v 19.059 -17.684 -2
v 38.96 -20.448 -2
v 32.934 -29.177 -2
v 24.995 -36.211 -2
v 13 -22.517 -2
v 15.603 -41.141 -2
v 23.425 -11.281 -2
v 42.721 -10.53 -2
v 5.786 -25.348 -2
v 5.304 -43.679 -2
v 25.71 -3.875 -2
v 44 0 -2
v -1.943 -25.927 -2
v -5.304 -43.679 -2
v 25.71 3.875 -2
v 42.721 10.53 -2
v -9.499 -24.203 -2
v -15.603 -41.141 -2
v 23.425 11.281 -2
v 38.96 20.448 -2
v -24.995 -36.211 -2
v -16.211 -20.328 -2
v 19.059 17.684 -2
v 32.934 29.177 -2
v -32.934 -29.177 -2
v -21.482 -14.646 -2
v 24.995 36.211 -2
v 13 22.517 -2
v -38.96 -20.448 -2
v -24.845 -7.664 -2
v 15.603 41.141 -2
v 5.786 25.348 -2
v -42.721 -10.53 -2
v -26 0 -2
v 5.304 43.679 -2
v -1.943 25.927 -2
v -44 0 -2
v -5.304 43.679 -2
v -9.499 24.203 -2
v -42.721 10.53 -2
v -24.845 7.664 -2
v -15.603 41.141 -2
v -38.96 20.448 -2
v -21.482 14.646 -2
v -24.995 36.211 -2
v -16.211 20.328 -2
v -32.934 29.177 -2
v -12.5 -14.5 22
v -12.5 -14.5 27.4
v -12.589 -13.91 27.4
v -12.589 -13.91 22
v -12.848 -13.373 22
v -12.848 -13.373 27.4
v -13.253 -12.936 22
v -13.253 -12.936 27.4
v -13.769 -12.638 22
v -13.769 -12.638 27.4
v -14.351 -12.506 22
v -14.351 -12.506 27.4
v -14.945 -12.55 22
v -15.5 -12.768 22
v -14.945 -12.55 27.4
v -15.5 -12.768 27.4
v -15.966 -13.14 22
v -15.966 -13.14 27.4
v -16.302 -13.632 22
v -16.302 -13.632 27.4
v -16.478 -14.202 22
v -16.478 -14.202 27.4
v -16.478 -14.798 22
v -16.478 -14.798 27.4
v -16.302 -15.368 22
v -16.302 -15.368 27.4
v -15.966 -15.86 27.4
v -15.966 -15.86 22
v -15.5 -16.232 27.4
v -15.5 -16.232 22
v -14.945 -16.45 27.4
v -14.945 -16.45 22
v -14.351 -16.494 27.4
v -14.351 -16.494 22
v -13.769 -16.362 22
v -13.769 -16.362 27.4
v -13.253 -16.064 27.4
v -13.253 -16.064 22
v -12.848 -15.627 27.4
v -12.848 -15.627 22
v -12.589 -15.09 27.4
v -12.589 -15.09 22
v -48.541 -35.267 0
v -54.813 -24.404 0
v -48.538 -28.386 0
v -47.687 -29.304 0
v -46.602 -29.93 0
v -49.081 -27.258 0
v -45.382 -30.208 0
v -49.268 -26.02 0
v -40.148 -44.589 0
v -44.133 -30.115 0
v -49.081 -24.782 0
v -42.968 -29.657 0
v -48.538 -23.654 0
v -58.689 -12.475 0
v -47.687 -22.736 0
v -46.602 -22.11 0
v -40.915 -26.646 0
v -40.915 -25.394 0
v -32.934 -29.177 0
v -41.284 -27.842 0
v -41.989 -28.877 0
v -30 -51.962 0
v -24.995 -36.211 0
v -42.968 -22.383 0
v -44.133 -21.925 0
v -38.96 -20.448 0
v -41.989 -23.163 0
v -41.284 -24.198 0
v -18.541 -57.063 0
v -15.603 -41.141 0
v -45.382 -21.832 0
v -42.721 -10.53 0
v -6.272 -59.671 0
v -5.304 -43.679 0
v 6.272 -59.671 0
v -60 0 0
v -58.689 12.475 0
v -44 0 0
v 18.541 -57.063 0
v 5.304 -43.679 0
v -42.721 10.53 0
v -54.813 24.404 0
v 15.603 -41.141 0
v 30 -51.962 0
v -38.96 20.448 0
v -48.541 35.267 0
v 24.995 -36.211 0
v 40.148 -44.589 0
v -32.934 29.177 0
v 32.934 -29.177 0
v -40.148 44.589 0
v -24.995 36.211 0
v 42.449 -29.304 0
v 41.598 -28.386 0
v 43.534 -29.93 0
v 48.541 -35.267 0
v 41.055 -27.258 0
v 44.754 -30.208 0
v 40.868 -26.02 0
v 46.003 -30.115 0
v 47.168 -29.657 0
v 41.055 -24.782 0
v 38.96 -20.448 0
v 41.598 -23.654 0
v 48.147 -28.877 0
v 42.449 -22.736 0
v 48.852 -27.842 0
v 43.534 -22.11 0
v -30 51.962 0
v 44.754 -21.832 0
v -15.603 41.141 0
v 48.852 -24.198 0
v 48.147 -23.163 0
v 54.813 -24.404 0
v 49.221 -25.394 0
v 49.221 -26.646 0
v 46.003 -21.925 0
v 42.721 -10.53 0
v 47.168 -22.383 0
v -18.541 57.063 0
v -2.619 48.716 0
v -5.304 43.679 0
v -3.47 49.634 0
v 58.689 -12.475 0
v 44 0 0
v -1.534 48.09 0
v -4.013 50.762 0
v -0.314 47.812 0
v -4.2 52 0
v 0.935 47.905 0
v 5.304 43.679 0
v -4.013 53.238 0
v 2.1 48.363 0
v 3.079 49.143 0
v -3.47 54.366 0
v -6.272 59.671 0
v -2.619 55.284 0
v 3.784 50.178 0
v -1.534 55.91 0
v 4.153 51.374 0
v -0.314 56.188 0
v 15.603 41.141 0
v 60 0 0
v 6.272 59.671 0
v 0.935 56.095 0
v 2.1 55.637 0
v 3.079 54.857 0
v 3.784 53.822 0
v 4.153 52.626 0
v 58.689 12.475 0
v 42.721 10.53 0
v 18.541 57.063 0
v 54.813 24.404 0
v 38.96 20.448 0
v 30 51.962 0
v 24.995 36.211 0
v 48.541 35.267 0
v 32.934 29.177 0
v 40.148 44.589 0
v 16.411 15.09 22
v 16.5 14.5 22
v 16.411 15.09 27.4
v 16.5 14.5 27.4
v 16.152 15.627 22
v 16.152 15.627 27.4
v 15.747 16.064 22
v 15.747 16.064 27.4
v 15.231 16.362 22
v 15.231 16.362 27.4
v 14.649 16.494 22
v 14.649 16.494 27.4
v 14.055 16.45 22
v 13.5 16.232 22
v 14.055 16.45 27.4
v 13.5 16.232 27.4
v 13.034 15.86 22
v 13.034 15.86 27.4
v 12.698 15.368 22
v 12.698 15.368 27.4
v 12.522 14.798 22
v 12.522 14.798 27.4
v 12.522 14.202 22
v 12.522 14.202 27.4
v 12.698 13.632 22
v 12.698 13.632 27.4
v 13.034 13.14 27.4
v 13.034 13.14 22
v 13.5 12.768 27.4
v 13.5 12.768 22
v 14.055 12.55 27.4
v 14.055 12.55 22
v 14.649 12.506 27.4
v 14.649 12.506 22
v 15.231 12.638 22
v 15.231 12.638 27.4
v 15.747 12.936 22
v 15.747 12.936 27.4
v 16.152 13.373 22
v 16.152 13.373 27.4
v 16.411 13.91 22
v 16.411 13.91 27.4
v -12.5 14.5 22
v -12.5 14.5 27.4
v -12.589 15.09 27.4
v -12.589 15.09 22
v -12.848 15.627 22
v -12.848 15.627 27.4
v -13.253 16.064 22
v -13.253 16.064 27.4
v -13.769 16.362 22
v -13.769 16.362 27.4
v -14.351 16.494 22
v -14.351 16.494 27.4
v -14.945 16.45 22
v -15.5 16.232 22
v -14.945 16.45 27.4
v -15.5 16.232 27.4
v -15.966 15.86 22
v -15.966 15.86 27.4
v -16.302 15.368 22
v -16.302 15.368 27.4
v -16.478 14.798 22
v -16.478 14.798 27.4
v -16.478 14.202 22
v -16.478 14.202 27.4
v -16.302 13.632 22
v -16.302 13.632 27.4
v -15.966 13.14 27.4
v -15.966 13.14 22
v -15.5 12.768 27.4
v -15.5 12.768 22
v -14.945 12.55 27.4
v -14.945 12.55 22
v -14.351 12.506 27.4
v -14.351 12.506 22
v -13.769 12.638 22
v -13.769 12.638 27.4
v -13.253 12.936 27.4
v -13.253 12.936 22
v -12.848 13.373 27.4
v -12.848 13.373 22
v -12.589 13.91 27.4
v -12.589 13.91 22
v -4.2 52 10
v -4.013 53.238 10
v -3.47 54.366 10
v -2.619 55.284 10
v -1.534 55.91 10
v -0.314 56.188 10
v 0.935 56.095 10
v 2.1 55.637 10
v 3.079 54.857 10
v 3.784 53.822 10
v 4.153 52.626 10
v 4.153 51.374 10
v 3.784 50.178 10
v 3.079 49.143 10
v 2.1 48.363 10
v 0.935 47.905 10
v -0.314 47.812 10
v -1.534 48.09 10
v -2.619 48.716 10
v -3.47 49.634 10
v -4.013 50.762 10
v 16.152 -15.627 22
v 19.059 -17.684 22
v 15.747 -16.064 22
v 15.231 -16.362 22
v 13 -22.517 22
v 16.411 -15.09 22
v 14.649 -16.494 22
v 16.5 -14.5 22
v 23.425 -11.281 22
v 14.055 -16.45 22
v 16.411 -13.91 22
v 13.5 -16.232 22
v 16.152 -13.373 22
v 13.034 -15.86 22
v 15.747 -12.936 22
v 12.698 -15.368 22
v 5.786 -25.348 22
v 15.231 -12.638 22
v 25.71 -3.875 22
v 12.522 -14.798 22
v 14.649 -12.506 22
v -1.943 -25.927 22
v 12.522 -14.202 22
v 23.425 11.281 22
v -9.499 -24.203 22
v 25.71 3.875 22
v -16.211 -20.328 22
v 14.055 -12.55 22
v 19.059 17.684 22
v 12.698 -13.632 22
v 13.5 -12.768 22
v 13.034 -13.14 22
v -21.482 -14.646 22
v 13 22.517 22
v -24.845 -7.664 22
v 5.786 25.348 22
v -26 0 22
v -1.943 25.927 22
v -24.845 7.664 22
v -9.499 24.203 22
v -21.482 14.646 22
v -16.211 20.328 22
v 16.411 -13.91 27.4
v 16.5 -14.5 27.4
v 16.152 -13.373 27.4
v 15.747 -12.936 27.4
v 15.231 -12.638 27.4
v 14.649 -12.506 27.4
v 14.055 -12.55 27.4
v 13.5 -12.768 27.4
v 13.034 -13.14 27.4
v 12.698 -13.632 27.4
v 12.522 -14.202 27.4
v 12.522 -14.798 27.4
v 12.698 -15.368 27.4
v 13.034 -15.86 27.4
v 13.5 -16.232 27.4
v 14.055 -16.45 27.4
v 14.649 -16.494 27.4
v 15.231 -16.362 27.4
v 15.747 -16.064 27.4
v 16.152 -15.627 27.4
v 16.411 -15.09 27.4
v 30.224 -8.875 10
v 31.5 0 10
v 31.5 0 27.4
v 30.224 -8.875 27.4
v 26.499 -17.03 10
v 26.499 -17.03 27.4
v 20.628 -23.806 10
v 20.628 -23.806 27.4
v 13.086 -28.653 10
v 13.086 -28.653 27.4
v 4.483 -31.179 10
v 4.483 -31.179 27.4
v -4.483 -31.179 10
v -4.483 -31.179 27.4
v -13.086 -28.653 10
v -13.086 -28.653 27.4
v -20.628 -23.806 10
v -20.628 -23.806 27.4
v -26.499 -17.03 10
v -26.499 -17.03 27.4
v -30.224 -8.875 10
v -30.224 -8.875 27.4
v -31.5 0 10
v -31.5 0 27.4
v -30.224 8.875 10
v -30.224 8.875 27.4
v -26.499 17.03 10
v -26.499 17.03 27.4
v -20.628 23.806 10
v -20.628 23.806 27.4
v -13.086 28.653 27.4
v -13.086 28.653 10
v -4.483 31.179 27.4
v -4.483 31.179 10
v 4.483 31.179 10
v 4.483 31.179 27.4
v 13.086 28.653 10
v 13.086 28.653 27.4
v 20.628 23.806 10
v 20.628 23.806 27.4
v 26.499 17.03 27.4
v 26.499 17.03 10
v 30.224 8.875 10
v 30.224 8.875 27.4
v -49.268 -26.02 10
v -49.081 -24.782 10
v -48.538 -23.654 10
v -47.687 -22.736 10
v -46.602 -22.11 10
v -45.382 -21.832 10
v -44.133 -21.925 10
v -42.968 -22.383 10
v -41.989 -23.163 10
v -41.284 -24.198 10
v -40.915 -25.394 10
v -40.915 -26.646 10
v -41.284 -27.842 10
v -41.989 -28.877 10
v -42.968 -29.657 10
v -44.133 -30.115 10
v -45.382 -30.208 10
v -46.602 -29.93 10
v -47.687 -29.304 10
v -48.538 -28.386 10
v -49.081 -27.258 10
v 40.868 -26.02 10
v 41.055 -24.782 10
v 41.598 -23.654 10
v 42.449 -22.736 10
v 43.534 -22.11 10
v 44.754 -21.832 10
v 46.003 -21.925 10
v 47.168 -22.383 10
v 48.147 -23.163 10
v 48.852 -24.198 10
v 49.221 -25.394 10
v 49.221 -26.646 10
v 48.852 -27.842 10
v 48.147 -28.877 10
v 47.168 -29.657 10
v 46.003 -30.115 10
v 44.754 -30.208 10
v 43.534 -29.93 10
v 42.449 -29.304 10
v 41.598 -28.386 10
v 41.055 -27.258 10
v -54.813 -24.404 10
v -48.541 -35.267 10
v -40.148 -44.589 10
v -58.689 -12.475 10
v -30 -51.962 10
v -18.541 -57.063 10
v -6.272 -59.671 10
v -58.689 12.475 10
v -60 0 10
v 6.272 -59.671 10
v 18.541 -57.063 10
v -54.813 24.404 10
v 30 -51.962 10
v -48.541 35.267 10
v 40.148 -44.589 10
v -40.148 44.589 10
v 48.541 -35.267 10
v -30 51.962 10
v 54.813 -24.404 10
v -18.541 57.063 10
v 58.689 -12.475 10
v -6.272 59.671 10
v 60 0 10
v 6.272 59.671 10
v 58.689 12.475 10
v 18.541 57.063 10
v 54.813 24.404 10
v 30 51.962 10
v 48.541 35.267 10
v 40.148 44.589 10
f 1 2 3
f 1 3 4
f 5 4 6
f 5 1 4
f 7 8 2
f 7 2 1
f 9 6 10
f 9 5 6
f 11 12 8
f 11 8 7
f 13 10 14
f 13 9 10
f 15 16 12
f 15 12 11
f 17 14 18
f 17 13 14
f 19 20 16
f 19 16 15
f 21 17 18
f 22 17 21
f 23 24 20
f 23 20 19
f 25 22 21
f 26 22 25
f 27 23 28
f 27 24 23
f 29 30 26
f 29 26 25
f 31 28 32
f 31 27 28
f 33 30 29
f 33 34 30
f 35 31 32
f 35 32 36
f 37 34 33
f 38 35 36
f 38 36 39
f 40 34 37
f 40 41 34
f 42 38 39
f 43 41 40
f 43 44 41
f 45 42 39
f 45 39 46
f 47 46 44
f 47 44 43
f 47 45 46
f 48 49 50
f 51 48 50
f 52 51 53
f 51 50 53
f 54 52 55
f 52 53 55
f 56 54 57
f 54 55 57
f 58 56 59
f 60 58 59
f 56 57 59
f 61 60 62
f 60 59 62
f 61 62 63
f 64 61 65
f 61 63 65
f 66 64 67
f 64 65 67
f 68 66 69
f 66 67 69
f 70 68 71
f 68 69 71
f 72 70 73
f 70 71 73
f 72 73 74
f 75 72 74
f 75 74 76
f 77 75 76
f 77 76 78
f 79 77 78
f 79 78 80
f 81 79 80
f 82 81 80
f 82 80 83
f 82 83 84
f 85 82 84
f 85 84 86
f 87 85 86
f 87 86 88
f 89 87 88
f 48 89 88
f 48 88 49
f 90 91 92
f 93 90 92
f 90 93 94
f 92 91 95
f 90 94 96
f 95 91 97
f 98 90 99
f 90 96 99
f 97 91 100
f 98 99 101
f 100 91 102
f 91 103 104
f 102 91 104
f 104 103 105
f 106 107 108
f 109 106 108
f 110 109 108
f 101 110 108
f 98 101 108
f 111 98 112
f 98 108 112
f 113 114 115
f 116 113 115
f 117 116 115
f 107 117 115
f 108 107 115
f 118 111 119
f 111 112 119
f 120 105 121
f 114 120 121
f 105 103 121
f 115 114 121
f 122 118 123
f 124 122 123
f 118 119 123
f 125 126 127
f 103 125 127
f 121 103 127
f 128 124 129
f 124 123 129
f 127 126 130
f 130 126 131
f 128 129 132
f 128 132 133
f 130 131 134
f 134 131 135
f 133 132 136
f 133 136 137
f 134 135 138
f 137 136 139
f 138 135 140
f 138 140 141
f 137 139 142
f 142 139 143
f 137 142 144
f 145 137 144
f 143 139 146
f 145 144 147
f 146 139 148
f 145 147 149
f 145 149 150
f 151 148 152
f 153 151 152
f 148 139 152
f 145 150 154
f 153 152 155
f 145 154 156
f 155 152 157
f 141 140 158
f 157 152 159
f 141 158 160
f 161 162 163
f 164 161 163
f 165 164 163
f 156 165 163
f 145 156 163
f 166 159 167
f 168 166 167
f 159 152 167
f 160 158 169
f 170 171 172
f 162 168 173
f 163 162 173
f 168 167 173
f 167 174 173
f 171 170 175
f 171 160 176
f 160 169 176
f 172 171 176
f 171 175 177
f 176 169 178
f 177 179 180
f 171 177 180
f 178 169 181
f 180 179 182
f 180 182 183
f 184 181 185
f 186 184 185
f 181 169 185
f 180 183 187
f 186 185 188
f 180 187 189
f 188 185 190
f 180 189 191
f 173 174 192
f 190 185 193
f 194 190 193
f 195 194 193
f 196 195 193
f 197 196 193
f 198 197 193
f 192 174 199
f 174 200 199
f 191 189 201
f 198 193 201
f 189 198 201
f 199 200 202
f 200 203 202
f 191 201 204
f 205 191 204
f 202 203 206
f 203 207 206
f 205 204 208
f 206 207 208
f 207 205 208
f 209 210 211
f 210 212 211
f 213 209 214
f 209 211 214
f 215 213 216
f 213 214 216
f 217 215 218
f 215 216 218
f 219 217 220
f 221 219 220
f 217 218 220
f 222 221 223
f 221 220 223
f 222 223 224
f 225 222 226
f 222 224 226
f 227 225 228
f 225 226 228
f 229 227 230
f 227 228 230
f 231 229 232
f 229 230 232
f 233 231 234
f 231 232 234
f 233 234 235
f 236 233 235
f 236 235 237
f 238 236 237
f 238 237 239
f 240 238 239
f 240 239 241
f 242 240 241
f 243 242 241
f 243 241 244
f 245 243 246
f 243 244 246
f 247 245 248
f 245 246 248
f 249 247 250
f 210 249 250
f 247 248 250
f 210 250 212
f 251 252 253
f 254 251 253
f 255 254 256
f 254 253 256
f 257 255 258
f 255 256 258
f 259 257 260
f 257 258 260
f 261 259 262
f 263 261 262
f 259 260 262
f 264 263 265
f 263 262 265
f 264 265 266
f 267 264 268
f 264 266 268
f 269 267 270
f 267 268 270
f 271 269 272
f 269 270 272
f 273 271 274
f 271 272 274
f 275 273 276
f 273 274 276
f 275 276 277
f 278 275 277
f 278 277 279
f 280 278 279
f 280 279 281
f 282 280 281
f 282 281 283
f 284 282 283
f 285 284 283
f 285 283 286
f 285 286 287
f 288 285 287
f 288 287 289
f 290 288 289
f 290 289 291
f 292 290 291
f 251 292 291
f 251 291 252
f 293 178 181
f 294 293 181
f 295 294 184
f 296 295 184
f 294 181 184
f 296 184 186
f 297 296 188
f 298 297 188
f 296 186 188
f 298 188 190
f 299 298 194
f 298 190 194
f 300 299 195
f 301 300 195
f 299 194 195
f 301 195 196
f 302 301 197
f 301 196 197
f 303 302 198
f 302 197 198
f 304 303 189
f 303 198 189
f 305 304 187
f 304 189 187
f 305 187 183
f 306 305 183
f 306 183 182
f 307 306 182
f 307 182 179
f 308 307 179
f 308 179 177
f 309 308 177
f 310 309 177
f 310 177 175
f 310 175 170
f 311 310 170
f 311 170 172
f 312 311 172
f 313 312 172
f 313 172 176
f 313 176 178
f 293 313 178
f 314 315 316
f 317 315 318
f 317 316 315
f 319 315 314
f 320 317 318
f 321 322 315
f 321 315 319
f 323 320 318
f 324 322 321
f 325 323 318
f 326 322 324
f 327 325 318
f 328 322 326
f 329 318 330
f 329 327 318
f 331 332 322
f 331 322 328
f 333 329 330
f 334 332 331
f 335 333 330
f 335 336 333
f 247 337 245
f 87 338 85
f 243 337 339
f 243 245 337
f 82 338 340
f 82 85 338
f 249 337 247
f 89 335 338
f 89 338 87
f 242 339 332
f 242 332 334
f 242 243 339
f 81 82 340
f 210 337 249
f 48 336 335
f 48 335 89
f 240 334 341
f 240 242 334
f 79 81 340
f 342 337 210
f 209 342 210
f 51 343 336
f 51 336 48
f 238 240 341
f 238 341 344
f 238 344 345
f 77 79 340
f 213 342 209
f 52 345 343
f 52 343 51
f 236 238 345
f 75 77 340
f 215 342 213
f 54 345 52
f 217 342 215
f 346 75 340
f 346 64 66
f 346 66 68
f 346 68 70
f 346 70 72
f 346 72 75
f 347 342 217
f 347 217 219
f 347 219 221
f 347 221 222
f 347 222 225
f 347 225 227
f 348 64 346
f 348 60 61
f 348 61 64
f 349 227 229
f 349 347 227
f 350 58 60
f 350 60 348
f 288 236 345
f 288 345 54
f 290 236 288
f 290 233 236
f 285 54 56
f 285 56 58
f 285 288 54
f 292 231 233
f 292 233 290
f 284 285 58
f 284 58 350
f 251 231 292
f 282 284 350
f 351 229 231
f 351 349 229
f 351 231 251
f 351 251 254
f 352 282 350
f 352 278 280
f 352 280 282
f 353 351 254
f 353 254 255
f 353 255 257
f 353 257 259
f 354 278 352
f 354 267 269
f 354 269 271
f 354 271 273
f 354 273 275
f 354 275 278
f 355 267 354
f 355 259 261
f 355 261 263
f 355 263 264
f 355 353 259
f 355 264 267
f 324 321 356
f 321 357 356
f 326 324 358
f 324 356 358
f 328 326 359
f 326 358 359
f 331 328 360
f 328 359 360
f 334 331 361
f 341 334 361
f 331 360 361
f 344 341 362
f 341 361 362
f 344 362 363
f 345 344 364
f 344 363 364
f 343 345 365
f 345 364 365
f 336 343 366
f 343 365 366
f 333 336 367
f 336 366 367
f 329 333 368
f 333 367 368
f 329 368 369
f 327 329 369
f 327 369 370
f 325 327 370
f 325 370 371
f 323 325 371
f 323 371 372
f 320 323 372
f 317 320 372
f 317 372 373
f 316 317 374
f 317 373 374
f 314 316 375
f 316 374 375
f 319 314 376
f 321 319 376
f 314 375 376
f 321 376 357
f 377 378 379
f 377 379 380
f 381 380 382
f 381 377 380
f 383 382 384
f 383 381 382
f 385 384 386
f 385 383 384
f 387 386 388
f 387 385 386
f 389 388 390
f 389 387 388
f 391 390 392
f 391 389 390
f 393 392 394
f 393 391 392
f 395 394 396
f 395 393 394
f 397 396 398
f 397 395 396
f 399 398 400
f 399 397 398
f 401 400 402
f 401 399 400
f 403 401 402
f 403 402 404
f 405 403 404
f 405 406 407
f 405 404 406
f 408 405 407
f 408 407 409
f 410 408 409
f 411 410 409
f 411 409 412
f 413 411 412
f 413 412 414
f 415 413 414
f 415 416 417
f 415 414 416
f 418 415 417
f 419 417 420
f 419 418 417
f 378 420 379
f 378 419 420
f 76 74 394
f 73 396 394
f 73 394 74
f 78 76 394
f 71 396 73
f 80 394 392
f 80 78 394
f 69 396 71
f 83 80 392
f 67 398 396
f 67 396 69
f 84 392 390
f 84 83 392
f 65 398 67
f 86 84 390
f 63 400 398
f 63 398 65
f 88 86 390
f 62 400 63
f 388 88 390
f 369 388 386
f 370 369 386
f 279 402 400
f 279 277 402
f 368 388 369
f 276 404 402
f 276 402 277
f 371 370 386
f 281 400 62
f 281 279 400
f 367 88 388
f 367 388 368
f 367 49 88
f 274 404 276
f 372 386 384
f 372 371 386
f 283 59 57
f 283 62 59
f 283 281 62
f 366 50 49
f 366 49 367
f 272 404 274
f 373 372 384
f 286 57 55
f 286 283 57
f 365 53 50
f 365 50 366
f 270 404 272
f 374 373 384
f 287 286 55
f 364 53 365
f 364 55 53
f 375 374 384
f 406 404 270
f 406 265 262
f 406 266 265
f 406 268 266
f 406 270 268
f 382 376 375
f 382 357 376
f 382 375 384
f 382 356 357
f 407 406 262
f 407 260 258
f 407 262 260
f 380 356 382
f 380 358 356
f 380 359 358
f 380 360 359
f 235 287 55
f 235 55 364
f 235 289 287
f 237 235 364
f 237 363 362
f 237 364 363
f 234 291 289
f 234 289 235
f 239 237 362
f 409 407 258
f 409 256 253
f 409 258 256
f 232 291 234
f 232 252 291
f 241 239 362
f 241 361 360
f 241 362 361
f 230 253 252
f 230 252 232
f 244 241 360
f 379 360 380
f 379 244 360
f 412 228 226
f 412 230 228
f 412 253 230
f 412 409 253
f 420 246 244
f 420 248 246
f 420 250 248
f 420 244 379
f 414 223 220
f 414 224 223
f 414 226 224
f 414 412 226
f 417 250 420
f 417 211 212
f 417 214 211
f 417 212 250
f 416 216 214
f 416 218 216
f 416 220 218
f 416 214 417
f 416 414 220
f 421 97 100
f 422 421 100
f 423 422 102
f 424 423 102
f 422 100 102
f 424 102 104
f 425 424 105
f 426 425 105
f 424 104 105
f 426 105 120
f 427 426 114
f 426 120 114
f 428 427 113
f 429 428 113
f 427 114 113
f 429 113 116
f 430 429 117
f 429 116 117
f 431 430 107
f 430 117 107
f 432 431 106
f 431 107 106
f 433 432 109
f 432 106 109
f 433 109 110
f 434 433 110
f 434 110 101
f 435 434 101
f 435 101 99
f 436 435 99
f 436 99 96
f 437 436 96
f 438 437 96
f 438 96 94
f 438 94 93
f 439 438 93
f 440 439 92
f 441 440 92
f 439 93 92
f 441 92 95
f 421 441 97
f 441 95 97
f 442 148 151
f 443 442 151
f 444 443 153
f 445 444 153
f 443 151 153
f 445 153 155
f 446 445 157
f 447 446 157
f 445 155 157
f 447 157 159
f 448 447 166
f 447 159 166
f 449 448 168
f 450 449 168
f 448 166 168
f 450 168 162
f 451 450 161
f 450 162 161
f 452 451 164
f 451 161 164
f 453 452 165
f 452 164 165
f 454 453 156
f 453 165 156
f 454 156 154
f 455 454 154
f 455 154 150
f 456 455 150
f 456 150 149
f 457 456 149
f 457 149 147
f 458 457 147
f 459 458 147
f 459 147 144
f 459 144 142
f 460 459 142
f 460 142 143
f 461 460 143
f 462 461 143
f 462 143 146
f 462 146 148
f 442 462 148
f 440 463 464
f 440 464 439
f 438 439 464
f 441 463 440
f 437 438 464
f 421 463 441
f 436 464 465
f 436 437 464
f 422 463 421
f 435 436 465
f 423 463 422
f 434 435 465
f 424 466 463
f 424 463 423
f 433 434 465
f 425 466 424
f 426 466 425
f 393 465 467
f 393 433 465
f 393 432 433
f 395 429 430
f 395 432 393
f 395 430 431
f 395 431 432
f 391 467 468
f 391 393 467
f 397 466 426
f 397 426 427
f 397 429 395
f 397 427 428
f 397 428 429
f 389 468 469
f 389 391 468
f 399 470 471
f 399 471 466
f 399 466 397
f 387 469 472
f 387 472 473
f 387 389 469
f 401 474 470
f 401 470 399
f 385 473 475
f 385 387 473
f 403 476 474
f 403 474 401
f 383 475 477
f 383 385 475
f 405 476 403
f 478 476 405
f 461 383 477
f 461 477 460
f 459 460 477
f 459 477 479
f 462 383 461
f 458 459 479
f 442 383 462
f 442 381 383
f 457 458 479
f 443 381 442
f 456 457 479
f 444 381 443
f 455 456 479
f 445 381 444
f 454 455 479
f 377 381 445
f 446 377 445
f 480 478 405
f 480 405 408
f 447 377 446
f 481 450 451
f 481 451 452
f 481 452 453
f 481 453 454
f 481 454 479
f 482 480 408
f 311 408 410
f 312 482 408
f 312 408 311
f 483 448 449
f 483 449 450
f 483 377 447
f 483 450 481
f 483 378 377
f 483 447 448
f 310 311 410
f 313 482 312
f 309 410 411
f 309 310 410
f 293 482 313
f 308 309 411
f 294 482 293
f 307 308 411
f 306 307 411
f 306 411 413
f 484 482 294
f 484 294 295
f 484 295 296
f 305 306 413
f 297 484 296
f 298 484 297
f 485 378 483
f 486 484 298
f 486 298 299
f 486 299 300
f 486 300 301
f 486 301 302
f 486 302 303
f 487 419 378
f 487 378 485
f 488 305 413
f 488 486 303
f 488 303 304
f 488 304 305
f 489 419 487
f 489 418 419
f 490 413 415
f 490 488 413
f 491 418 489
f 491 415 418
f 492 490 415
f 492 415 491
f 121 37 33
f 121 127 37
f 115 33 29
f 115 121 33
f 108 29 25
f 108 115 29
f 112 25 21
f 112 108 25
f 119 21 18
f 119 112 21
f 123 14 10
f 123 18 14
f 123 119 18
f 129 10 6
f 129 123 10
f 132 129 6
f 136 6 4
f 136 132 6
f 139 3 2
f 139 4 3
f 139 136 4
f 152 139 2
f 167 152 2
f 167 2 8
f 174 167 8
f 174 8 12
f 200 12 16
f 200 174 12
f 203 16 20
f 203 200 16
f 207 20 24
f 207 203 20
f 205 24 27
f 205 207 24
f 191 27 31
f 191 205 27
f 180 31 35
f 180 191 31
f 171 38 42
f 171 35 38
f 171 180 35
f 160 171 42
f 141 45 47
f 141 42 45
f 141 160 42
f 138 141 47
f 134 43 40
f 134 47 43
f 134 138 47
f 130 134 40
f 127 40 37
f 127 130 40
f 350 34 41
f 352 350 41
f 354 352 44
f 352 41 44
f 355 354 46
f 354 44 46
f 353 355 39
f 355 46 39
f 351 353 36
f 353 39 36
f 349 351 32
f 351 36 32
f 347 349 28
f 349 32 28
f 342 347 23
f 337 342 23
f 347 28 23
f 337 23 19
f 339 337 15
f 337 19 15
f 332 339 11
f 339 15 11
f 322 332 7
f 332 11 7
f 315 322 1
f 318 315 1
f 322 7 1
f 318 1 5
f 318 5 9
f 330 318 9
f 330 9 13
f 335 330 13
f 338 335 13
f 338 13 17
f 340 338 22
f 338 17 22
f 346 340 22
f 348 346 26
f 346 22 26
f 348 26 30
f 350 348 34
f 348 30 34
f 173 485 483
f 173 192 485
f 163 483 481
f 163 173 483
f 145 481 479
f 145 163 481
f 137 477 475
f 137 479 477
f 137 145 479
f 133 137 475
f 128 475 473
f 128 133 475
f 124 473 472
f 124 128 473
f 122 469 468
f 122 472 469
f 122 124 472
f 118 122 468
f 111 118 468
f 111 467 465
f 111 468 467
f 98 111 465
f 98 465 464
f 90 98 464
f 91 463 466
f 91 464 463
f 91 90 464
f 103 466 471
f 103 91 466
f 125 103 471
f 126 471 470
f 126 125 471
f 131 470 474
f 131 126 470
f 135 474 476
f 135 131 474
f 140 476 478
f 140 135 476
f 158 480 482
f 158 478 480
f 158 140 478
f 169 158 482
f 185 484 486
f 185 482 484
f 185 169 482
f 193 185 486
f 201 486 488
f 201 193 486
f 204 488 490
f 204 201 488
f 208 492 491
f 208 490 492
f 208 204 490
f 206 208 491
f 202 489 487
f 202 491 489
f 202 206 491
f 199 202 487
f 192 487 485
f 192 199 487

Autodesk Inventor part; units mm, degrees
ref_plane "YZ Plane" through (0, 0, 0) normal (1, 0, 0) x (0, 1, 0)
ref_plane "XZ Plane" through (0, 0, 0) normal (0, 1, 0) x (-1, 0, 0)
ref_plane "XY Plane" through (0, 0, 0) normal (0, 0, 1) x (1, 0, 0)
sketch "Sketch1" plane through (0, 0, 0) normal (0, 0, 1) x (1, 0, 0)
  circle A0 centre (0, 0) radius 60
  dimension "d0" = 120
extrude "Extrusion1" add sketch "Sketch1" along normal blind 10
sketch "Sketch2" plane through (0, 0, 10) normal (0, 0, 1) x (1, 0, 0)
  circle A0 centre (0, 0) radius 31.5
  dimension "d3" = 63
extrude "Extrusion2" add sketch "Sketch2" along normal blind 17.4
sketch "Sketch3" plane through (0, 0, 27.4) normal (0, 0, 1) x (1, 0, 0)
  circle A0 centre (-14.5, 14.5) radius 2
  circle A1 centre (14.5, 14.5) radius 2
  circle A2 centre (14.5, -14.5) radius 2
  circle A3 centre (-14.5, -14.5) radius 2
  point P0 (0, 0)
  dimension "d6" = 4
  dimension "d7" = 4
  dimension "d8" = 4
  dimension "d9" = 4
  dimension "d10" = 29
  dimension "d11" = 29
  dimension "d12" = 29
  dimension "d13" = 29
  dimension "d18" = 20.5061
  dimension "d19" = 20.5061
  dimension "d20" = 20.5061
extrude "Extrusion3" cut sketch "Sketch3" against normal through all
sketch "Sketch4" plane through (0, 0, 0) normal (0, 0, -1) x (-1, 0, 0)
  circle A0 centre (0, 0) radius 44
  dimension "d23" = 88
extrude "Extrusion4" add sketch "Sketch4" along normal blind 2
sketch "Sketch5" plane through (0, 0, -2) normal (0, 0, -1) x (-1, 0, 0)
  circle A0 centre (0, 0) radius 26
  dimension "d26" = 52
extrude "Extrusion5" cut sketch "Sketch5" against normal blind 24
sketch "Sketch6" plane through (0, 0, 0) normal (0, 0, -1) x (-1, 0, 0)
  circle A0 centre (-45.068, -26.02) radius 4.2
  circle A1 centre (45.068, -26.02) radius 4.2
  circle A2 centre (0, 52) radius 4.2
  circle A3 centre (0, 0) radius 44 projected
  dimension "d29" = 8.4
  dimension "d30" = 8.4
  dimension "d31" = 8.4
extrude "Extrusion6" cut sketch "Sketch6" against normal blind 10 contours A0 | A1 | A2
properties part number "tampa traseira acoplada final"
